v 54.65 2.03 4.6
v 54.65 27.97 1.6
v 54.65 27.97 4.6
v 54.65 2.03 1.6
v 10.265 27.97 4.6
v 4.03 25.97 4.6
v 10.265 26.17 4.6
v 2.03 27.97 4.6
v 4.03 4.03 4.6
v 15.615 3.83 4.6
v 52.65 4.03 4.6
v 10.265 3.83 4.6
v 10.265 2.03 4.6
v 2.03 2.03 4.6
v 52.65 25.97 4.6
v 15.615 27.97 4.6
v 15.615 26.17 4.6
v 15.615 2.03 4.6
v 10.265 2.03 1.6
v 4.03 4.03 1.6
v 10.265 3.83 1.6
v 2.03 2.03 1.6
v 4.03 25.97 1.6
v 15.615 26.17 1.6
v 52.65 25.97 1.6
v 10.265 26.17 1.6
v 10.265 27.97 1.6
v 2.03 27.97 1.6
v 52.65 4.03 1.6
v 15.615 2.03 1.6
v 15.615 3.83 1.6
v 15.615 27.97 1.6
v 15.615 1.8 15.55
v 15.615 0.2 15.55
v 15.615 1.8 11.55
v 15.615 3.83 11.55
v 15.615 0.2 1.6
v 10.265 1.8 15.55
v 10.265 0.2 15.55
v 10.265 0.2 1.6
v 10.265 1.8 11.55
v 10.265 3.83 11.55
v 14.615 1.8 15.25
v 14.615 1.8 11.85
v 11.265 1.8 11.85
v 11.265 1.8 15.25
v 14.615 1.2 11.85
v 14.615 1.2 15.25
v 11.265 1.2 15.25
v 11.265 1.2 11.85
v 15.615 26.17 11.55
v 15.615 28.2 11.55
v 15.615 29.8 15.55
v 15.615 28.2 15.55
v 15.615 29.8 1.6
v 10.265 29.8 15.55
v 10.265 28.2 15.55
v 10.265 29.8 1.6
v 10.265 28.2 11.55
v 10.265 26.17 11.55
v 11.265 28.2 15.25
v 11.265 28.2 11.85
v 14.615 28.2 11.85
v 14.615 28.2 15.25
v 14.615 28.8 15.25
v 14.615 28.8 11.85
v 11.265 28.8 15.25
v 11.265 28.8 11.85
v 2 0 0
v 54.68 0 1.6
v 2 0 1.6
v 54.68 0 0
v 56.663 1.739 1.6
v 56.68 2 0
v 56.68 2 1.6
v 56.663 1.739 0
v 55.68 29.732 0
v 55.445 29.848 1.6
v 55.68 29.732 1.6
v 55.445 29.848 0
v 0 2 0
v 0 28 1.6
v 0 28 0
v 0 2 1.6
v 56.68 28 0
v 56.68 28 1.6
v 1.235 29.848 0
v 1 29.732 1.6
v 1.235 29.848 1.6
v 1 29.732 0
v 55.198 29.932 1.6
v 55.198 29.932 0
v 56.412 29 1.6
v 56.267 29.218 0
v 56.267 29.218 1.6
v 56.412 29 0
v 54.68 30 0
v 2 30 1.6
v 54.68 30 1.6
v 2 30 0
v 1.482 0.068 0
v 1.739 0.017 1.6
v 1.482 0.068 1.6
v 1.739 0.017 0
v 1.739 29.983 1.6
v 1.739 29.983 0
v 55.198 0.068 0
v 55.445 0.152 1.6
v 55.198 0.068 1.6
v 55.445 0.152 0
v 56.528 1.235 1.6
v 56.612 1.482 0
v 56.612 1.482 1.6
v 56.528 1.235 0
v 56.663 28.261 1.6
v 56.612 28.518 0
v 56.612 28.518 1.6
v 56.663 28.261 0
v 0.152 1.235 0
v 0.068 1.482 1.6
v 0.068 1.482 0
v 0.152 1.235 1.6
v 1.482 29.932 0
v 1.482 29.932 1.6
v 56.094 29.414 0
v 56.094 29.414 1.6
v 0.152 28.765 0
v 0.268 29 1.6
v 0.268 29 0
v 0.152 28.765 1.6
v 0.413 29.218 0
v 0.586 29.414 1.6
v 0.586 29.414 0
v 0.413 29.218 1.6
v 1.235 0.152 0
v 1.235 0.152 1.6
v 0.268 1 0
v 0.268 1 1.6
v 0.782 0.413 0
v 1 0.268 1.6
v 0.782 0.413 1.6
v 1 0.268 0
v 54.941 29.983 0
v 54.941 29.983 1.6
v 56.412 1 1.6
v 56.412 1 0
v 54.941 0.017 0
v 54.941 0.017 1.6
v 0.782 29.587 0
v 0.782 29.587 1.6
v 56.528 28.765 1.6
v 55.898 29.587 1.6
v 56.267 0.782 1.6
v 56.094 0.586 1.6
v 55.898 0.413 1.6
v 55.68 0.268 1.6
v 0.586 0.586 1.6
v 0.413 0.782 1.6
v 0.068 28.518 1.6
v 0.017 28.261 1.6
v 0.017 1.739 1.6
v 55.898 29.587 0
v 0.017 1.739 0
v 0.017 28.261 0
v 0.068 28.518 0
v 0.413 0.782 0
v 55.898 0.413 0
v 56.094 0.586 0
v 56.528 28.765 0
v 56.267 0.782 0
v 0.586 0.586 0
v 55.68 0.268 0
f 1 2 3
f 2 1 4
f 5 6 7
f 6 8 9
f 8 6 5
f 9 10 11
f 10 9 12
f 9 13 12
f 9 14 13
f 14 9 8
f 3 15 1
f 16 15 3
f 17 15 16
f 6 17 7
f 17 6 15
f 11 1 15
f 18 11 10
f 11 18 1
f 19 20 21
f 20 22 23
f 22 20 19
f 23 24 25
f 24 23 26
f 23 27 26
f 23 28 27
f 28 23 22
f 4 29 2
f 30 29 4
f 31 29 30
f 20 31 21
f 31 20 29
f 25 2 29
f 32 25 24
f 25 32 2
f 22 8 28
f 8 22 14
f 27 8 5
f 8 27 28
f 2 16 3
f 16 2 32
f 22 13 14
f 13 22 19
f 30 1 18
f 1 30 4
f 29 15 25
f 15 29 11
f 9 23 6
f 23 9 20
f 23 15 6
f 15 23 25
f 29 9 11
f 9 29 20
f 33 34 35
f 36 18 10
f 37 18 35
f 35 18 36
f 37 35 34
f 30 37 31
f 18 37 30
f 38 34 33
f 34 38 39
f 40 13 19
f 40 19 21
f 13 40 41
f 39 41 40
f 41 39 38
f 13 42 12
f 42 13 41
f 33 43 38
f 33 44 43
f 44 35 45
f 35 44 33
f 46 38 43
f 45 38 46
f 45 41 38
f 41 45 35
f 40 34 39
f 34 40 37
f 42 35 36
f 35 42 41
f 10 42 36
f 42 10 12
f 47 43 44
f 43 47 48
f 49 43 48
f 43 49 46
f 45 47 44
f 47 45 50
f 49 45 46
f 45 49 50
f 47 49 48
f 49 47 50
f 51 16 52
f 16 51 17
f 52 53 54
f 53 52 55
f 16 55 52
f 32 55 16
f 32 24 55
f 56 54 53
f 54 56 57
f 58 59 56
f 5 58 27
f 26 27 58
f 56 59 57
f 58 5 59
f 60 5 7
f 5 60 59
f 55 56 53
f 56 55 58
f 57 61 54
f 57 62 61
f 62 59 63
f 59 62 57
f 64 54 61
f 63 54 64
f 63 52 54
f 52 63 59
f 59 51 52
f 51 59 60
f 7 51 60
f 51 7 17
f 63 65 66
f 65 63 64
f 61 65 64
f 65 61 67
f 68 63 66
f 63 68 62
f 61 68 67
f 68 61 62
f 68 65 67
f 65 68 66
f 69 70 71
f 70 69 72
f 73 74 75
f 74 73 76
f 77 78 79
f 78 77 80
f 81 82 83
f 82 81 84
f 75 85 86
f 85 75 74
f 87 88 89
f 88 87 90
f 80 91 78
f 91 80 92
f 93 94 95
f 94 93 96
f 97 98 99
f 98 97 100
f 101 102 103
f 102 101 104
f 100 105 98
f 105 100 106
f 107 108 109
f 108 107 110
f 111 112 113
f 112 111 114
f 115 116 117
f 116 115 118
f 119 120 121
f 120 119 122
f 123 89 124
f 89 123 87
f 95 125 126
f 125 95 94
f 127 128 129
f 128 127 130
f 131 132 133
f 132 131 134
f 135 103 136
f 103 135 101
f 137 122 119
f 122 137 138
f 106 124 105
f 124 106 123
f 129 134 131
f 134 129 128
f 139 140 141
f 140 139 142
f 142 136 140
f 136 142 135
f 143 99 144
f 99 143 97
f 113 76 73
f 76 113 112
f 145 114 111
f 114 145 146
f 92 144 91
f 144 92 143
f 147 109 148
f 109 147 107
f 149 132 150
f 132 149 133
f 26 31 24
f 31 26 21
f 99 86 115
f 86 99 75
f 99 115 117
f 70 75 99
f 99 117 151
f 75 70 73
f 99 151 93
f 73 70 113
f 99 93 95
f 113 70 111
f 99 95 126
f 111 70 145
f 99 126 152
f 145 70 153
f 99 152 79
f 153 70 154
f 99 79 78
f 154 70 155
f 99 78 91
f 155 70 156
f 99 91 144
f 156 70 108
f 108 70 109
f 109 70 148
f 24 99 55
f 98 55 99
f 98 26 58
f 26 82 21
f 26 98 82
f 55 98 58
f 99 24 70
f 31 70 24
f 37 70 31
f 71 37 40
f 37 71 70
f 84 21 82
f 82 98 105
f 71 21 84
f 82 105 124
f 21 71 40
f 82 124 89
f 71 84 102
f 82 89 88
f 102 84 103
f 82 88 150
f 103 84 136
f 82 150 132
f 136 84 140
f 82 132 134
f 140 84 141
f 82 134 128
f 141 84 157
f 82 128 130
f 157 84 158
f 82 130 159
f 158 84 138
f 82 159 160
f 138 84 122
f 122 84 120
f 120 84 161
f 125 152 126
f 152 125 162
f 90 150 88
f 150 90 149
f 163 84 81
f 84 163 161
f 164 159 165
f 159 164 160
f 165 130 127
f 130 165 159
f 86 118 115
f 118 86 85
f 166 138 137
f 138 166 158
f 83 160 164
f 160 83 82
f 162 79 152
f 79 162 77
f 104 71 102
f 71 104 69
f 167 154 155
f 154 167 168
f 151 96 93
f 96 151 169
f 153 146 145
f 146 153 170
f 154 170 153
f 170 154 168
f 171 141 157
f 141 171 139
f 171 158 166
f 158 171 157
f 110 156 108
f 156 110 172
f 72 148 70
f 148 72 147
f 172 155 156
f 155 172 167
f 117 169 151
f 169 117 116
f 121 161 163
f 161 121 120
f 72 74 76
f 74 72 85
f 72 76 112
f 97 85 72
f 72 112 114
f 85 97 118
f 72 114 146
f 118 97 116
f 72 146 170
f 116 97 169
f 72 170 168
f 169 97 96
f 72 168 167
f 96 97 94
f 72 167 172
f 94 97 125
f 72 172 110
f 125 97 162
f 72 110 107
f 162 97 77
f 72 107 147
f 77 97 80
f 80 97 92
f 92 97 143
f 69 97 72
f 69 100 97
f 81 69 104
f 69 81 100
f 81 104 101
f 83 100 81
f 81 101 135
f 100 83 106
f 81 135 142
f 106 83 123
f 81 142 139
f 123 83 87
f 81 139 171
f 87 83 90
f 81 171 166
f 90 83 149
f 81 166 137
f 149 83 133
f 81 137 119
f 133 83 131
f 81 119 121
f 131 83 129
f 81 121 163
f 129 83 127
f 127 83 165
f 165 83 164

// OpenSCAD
// EXPORT TO STL (run in PowerShell from this folder; same as F6 then F7 in the app):
// & "C:\Program Files\OpenSCAD\openscad.exe" -o ..\lilygo_cover_test9.stl cover.scad
// cover.scad - LilyGO top cover, built step by step (prototype in PLA, final in TPU)
$fn = 48;

// STEP 1: settings - copied from build.scad so the cover matches the shell outline
pcb_l = 51.74;  pcb_w = 25.51;                   // the circuit board
fit   = 0.20;                                    // gap around the board
rw    = 2.0;                                     // shell wall thickness
plug_over = 0.54;                                // white plugs stick out past the USB-C end
blk_w = 25.6;                                    // clear block width
in_l = pcb_l + plug_over + 2*fit;                // inside length of the shell (52.68)
in_w = blk_w + 2*fit;                            // inside width of the shell (26.0)
corner_r = 2.0;                                  // outside corner radius, same as the shell

lid_t = 1.6;                                     // thickness of the flat cover plate

// a box with rounded vertical edges (same module as in build.scad)
module rrect(l, w, h, r) {
  hull()
    for (x = [r, l - r], y = [r, w - r])
      translate([x, y, 0]) cylinder(r = r, h = h);
}

// STEP 2: the flat cover plate, same outline as the shell (56.68 x 30.0)
rrect(in_l + 2*rw, in_w + 2*rw, lid_t, corner_r);
// STEP 3: the lip - a hollow ring that drops into the shell's opening and keeps the cover centred
lip_gap  = 0.03;   // clearance on each side (0.20 loose, 0.08 still a bit loose, 0.03 = tight press fit)
lip_wall = 2.0;    // thickness of the ring (was 1.2)
lip_h    = 3.0;    // how far it sticks down into the shell

lip_l = in_l - 2*lip_gap;
lip_w = in_w - 2*lip_gap;

translate([rw + lip_gap, rw + lip_gap, lid_t])        // sits on the plate, inside the shell's cavity outline
  difference() {
    cube([lip_l, lip_w, lip_h]);                      // solid block...
    translate([lip_wall, lip_wall, -1])               // ...hollowed out, leaving a wall of lip_wall
      cube([lip_l - 2*lip_wall, lip_w - 2*lip_wall, lip_h + 2]);
  }
// STEP 4: button posts - one on each long wall, running down the side slot toward the power/reset buttons
// (shell numbers copied from build.scad; change them there and here together)
plate = 1.2;  blk_h = 6.44;
pcb_top   = plate + blk_h + 0.1;                 // z of the board's top surface in the shell
side_x    = 10.2;  slot_len = 5.5;  slot_top = 3.2;
bat_extra = 5.0;                                 // matches build.scad (taller body). Use 0 to fit the OLD 13.9 mm body.
bat_clr   = 0.0;
depth     = 13.9 + bat_extra + bat_clr;          // shell height
bx        = rw + plug_over + fit;                // shell x of the board's USB-C edge

post_tip_z = pcb_top - slot_top + 0.4;           // slot bottom is at pcb_top - slot_top (4.54); stop 0.4 above it so the tab reaches the full slot
post_len   = depth - post_tip_z;                 // lid underside sits at z = depth, so this is how far the post reaches down
post_w     = slot_len - 0.15;                    // 0.075 clearance each side of the slot
post_t     = rw - 0.4;                           // thickness in the wall plane, 0.2 clearance each side
shell_w    = in_w + 2*rw;                        // outer width of the shell

ext = lip_gap + lip_wall;                        // extra thickness so each post joins the ring wall (only along the ring, see below)

// STEP 5b: pocket on the inside face of each tab, so the flex only touches the button when pressed
pocket_d = 0.6;                                  // how deep the pocket goes into the tab (leaves post_t - pocket_d of skin)
pocket_h = 3.4;                                  // pocket height along the tab
pocket_w = post_w - 2.0;                         // pocket width, leaving 1 mm rails each side
btn_from_tip = 2.0;                              // button centre is 2 mm from the tab tip
tip_z = lid_t - 0.01 + post_len;                 // z of the tab tip in this plate-down lid

thick_len = post_len - (btn_from_tip + pocket_h/2) - 0.3;   // thick part ends 0.3 mm above the pocket top (measured from the lid plate)
module tab(far) {
  x0 = bx + side_x - post_w/2;
  y0 = far ? shell_w - 0.2 - post_t : 0.2;       // outer face at the shell edge, slot-thin all the way down
  jy = far ? shell_w - 0.2 - post_t - ext : 0.2; // wider start where it joins the ring
  difference() {
    union() {
      translate([x0, y0, lid_t - 0.01]) cube([post_w, post_t, post_len]);               // slim tab, fits inside the slot only
      translate([x0, jy, lid_t - 0.01]) cube([post_w, post_t + ext, thick_len]);   // thick joint, down to just above the pocket
    }
    // pocket on the inner face (toward the board), centred btn_from_tip below the tip
    py = far ? y0 - 0.01 : y0 + post_t - pocket_d;
    translate([bx + side_x - pocket_w/2, py, tip_z - btn_from_tip - pocket_h/2])
      cube([pocket_w, pocket_d + 0.01, pocket_h]);
  }
}
tab(false);   // near wall
tab(true);    // far wall (mirror)
